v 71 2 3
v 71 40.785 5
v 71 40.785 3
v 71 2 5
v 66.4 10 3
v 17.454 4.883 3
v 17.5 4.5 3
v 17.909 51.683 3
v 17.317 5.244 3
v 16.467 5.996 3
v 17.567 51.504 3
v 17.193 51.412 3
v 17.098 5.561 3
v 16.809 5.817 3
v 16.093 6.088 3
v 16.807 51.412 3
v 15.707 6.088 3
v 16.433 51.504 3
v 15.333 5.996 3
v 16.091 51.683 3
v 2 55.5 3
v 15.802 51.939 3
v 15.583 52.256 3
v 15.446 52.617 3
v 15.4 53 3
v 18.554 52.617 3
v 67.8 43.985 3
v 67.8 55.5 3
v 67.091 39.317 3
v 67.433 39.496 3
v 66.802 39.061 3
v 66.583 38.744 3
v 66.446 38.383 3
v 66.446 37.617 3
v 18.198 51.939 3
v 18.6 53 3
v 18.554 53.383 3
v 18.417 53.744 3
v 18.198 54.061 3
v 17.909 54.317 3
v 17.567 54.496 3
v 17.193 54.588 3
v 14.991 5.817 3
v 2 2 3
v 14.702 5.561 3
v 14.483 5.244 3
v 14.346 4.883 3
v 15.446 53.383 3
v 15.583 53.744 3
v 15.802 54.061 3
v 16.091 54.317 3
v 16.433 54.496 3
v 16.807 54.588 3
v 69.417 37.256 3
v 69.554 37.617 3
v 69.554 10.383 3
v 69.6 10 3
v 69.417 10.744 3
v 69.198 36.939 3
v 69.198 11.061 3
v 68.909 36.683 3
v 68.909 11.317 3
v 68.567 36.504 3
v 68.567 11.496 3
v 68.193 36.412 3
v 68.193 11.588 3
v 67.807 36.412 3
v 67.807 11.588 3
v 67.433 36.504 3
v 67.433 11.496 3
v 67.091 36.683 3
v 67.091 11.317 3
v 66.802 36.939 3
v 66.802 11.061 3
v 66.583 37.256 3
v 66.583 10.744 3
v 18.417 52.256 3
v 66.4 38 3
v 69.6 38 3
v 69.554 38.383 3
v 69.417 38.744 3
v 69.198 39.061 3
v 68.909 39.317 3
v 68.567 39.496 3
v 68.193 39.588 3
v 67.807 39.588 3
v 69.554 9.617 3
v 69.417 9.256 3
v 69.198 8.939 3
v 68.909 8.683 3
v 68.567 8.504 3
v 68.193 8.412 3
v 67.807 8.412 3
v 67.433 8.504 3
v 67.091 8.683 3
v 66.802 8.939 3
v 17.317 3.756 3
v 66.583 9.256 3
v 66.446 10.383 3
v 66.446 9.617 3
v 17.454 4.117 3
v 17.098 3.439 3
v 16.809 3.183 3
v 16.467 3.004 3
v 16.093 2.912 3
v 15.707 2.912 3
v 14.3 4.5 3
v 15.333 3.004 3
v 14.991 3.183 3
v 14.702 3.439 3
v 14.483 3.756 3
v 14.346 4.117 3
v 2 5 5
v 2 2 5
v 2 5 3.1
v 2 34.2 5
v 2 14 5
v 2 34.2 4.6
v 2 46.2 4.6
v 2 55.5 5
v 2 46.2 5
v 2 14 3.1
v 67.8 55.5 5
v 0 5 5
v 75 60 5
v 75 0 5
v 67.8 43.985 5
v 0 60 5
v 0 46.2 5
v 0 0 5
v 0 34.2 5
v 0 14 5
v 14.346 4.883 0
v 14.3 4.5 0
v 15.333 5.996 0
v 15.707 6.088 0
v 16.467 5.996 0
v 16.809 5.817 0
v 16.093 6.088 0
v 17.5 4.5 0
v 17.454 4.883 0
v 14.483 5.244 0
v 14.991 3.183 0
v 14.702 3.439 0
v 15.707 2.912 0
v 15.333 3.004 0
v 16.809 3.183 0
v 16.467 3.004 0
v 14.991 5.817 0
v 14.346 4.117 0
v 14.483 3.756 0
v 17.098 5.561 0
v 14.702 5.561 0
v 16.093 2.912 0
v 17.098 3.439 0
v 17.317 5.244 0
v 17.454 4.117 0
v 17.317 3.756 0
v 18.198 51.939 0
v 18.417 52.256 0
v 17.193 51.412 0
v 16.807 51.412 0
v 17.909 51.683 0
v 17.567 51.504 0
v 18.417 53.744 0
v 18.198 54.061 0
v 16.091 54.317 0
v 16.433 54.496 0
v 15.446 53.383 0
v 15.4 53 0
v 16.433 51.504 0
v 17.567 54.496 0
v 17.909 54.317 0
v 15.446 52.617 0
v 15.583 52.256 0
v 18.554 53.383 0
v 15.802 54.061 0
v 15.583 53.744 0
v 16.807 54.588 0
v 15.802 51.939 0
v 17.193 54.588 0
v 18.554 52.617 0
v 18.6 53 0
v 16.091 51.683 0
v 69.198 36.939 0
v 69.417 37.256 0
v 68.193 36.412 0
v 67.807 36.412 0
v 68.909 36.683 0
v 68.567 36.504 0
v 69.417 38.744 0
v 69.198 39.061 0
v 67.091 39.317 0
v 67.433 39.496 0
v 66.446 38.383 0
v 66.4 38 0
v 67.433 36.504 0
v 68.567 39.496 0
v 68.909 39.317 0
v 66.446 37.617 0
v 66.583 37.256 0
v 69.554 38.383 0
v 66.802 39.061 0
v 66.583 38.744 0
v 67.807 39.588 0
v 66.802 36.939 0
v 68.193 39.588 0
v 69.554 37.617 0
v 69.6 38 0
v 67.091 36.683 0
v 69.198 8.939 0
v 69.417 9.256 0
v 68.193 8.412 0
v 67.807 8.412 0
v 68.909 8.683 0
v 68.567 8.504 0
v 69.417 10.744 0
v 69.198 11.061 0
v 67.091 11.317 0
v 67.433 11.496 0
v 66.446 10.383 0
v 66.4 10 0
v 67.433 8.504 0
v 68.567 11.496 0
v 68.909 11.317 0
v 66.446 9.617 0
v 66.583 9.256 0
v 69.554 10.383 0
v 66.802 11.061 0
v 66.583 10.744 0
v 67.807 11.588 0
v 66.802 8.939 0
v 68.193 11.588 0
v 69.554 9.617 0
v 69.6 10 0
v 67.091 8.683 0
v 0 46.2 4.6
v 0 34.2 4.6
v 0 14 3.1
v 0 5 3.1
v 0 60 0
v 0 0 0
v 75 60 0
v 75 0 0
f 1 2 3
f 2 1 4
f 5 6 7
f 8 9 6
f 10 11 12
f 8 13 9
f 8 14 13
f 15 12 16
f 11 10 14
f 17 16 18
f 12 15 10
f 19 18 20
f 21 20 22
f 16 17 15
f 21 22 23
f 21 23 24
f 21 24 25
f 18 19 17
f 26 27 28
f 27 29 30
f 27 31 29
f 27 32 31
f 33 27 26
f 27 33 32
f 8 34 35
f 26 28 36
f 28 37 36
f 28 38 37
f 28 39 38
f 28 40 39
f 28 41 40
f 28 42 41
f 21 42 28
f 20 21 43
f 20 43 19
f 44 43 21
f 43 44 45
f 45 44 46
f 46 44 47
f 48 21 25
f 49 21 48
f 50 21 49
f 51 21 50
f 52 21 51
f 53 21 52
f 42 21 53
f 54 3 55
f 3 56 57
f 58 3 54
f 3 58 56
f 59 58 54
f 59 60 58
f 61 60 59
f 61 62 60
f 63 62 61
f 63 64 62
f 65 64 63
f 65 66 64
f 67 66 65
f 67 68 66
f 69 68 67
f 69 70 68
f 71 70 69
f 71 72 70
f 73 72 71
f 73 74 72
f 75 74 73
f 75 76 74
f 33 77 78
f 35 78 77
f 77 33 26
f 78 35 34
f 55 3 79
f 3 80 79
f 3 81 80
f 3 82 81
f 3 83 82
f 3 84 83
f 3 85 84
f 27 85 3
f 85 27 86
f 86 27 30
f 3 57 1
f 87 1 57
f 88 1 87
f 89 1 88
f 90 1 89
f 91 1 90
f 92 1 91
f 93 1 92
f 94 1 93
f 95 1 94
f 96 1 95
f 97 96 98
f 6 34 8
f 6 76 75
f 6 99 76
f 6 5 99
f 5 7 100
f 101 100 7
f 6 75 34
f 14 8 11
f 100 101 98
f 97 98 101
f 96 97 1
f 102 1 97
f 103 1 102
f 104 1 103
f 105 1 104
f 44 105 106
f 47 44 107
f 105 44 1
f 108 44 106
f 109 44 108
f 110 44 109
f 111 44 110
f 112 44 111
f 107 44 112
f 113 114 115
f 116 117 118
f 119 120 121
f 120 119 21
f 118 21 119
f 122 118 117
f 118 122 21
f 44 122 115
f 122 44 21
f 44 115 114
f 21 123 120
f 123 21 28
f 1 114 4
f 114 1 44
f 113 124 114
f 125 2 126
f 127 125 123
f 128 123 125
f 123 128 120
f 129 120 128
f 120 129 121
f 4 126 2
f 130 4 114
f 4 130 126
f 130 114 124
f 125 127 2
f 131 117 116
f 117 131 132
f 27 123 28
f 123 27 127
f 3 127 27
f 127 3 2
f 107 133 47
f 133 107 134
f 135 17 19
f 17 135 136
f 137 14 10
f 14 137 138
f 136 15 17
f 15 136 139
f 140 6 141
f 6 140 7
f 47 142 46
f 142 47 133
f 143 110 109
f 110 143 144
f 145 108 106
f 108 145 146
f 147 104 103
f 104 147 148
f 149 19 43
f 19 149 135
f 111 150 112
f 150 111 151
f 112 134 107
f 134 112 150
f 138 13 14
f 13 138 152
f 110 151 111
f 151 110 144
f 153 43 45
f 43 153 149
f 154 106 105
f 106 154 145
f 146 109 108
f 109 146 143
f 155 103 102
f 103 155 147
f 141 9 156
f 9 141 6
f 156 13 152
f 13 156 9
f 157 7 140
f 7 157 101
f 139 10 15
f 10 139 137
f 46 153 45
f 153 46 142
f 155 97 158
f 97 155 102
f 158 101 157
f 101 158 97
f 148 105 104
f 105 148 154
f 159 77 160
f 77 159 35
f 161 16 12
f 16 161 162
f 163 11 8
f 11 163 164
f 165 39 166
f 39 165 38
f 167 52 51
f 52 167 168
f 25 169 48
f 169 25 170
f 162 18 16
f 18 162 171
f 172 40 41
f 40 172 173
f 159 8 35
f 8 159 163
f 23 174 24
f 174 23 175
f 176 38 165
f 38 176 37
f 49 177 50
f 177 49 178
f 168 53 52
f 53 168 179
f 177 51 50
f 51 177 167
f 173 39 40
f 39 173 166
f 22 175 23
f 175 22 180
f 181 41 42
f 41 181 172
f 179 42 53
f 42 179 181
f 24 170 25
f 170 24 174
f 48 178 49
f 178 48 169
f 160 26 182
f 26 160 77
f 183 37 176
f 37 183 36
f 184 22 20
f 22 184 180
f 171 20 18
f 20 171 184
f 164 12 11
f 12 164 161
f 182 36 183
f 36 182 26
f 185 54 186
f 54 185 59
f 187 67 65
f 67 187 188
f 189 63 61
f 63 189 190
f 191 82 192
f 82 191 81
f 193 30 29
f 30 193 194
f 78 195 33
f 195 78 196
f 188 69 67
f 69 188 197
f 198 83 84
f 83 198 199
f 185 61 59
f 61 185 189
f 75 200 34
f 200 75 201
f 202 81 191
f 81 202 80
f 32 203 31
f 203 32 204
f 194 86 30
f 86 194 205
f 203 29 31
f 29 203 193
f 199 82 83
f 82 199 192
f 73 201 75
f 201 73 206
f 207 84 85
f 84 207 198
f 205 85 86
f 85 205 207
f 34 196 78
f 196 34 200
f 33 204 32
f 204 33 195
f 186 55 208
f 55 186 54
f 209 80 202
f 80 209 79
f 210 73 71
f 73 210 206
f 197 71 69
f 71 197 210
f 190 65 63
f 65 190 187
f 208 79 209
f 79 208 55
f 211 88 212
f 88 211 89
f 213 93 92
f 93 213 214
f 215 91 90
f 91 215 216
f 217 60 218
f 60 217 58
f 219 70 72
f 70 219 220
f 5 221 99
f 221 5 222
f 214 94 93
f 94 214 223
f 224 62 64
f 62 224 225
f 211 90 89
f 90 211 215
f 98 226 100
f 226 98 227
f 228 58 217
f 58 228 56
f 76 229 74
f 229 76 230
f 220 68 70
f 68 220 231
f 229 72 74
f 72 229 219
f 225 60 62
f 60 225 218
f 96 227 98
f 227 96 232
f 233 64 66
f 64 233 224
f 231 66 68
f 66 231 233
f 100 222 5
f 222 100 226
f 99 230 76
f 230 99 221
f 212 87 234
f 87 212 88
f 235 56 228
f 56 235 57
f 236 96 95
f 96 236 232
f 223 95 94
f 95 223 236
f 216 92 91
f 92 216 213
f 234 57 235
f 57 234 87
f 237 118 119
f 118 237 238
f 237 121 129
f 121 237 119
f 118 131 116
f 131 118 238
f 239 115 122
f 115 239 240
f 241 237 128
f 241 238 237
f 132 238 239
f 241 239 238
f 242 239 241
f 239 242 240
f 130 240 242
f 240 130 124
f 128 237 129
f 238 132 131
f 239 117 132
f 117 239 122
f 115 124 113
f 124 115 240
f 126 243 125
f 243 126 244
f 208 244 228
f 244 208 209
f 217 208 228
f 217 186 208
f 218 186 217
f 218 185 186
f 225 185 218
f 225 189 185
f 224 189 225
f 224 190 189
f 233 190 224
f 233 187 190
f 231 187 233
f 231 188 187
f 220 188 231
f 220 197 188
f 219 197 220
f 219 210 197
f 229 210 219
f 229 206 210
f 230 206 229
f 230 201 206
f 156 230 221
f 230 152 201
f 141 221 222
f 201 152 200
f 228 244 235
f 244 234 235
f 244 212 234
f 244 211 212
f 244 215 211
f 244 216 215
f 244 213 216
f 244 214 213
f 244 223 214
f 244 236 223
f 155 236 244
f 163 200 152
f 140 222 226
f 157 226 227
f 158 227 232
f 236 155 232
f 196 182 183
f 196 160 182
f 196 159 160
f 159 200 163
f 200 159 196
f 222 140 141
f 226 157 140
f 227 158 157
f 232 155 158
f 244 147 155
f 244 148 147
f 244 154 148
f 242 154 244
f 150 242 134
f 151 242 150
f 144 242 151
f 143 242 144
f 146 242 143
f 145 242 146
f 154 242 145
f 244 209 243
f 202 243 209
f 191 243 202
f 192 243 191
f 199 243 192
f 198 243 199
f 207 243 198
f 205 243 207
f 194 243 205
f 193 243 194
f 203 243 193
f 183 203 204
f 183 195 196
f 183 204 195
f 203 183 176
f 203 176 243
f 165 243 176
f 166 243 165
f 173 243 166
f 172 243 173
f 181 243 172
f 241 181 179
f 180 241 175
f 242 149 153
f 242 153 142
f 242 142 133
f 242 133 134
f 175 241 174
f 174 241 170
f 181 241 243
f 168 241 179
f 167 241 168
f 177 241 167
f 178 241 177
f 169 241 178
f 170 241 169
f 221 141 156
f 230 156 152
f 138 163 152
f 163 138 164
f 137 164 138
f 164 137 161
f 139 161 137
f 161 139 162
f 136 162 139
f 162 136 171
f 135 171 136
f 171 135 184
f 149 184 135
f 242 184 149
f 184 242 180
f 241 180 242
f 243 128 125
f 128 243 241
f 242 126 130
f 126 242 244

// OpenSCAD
// file: arduino_uno.scad
board_lenght = 53.5;
board_wide = 69;
board_thick = 1.7;

screw_hole_r = 1.6;

module screw_hole(screws_lenght) {
	cylinder(h = screws_lenght, r = screw_hole_r);
}

module arduino_uno_board(extra_thick = 0, screws_lenght = 3) {
	union() {

		// Circuit board
		color("SteelBlue")
			difference() {
				union() {
					cube([board_wide, board_lenght, board_thick]); // Base board
					translate([0, 0, board_thick - 0.1])
						cube([board_wide, board_lenght, extra_thick]); // Cube added for extra thickness
				}
				
				
				// Small hole top right
				translate([65.8, 37.5, -0.5])
					difference() { 
						cube([5, 20.5, 2.5]);

						translate([0, -4, -0.5])
							rotate([0, 0, 45])
								cube(6);
					}
			}

		// Remove the screw holes
		translate([13.9, 2.5, board_thick + extra_thick + 0.5])
			rotate([0, 180, 0])
				screw_hole(screws_lenght);
		translate([15, 51, board_thick + extra_thick + 0.5])
			rotate([0, 180, 0])
				screw_hole(screws_lenght);
		translate([66, 36, board_thick + extra_thick + 0.5])
			rotate([0, 180, 0])
				screw_hole(screws_lenght);
		translate([66, 8, board_thick + extra_thick + 0.5])
			rotate([0, 180, 0])
				screw_hole(screws_lenght);
		

		// USB A port
		color("Silver")
			translate([-6, 32.2, board_thick-0.1])
				cube([16.4, 12, 10.7]);
		
		// Power supply
		color("black")
			translate([-2, 3, 0.1])
				cube([13.5, 9, 12.5]);
	}
}
// main file
include <arduino_uno.scad>

$fa = 1;
$fs = 0.4;

difference() {
    cube([75, 60, 5]);

    translate([2, 2, 3])
        arduino_uno_board(10, 30);
}
